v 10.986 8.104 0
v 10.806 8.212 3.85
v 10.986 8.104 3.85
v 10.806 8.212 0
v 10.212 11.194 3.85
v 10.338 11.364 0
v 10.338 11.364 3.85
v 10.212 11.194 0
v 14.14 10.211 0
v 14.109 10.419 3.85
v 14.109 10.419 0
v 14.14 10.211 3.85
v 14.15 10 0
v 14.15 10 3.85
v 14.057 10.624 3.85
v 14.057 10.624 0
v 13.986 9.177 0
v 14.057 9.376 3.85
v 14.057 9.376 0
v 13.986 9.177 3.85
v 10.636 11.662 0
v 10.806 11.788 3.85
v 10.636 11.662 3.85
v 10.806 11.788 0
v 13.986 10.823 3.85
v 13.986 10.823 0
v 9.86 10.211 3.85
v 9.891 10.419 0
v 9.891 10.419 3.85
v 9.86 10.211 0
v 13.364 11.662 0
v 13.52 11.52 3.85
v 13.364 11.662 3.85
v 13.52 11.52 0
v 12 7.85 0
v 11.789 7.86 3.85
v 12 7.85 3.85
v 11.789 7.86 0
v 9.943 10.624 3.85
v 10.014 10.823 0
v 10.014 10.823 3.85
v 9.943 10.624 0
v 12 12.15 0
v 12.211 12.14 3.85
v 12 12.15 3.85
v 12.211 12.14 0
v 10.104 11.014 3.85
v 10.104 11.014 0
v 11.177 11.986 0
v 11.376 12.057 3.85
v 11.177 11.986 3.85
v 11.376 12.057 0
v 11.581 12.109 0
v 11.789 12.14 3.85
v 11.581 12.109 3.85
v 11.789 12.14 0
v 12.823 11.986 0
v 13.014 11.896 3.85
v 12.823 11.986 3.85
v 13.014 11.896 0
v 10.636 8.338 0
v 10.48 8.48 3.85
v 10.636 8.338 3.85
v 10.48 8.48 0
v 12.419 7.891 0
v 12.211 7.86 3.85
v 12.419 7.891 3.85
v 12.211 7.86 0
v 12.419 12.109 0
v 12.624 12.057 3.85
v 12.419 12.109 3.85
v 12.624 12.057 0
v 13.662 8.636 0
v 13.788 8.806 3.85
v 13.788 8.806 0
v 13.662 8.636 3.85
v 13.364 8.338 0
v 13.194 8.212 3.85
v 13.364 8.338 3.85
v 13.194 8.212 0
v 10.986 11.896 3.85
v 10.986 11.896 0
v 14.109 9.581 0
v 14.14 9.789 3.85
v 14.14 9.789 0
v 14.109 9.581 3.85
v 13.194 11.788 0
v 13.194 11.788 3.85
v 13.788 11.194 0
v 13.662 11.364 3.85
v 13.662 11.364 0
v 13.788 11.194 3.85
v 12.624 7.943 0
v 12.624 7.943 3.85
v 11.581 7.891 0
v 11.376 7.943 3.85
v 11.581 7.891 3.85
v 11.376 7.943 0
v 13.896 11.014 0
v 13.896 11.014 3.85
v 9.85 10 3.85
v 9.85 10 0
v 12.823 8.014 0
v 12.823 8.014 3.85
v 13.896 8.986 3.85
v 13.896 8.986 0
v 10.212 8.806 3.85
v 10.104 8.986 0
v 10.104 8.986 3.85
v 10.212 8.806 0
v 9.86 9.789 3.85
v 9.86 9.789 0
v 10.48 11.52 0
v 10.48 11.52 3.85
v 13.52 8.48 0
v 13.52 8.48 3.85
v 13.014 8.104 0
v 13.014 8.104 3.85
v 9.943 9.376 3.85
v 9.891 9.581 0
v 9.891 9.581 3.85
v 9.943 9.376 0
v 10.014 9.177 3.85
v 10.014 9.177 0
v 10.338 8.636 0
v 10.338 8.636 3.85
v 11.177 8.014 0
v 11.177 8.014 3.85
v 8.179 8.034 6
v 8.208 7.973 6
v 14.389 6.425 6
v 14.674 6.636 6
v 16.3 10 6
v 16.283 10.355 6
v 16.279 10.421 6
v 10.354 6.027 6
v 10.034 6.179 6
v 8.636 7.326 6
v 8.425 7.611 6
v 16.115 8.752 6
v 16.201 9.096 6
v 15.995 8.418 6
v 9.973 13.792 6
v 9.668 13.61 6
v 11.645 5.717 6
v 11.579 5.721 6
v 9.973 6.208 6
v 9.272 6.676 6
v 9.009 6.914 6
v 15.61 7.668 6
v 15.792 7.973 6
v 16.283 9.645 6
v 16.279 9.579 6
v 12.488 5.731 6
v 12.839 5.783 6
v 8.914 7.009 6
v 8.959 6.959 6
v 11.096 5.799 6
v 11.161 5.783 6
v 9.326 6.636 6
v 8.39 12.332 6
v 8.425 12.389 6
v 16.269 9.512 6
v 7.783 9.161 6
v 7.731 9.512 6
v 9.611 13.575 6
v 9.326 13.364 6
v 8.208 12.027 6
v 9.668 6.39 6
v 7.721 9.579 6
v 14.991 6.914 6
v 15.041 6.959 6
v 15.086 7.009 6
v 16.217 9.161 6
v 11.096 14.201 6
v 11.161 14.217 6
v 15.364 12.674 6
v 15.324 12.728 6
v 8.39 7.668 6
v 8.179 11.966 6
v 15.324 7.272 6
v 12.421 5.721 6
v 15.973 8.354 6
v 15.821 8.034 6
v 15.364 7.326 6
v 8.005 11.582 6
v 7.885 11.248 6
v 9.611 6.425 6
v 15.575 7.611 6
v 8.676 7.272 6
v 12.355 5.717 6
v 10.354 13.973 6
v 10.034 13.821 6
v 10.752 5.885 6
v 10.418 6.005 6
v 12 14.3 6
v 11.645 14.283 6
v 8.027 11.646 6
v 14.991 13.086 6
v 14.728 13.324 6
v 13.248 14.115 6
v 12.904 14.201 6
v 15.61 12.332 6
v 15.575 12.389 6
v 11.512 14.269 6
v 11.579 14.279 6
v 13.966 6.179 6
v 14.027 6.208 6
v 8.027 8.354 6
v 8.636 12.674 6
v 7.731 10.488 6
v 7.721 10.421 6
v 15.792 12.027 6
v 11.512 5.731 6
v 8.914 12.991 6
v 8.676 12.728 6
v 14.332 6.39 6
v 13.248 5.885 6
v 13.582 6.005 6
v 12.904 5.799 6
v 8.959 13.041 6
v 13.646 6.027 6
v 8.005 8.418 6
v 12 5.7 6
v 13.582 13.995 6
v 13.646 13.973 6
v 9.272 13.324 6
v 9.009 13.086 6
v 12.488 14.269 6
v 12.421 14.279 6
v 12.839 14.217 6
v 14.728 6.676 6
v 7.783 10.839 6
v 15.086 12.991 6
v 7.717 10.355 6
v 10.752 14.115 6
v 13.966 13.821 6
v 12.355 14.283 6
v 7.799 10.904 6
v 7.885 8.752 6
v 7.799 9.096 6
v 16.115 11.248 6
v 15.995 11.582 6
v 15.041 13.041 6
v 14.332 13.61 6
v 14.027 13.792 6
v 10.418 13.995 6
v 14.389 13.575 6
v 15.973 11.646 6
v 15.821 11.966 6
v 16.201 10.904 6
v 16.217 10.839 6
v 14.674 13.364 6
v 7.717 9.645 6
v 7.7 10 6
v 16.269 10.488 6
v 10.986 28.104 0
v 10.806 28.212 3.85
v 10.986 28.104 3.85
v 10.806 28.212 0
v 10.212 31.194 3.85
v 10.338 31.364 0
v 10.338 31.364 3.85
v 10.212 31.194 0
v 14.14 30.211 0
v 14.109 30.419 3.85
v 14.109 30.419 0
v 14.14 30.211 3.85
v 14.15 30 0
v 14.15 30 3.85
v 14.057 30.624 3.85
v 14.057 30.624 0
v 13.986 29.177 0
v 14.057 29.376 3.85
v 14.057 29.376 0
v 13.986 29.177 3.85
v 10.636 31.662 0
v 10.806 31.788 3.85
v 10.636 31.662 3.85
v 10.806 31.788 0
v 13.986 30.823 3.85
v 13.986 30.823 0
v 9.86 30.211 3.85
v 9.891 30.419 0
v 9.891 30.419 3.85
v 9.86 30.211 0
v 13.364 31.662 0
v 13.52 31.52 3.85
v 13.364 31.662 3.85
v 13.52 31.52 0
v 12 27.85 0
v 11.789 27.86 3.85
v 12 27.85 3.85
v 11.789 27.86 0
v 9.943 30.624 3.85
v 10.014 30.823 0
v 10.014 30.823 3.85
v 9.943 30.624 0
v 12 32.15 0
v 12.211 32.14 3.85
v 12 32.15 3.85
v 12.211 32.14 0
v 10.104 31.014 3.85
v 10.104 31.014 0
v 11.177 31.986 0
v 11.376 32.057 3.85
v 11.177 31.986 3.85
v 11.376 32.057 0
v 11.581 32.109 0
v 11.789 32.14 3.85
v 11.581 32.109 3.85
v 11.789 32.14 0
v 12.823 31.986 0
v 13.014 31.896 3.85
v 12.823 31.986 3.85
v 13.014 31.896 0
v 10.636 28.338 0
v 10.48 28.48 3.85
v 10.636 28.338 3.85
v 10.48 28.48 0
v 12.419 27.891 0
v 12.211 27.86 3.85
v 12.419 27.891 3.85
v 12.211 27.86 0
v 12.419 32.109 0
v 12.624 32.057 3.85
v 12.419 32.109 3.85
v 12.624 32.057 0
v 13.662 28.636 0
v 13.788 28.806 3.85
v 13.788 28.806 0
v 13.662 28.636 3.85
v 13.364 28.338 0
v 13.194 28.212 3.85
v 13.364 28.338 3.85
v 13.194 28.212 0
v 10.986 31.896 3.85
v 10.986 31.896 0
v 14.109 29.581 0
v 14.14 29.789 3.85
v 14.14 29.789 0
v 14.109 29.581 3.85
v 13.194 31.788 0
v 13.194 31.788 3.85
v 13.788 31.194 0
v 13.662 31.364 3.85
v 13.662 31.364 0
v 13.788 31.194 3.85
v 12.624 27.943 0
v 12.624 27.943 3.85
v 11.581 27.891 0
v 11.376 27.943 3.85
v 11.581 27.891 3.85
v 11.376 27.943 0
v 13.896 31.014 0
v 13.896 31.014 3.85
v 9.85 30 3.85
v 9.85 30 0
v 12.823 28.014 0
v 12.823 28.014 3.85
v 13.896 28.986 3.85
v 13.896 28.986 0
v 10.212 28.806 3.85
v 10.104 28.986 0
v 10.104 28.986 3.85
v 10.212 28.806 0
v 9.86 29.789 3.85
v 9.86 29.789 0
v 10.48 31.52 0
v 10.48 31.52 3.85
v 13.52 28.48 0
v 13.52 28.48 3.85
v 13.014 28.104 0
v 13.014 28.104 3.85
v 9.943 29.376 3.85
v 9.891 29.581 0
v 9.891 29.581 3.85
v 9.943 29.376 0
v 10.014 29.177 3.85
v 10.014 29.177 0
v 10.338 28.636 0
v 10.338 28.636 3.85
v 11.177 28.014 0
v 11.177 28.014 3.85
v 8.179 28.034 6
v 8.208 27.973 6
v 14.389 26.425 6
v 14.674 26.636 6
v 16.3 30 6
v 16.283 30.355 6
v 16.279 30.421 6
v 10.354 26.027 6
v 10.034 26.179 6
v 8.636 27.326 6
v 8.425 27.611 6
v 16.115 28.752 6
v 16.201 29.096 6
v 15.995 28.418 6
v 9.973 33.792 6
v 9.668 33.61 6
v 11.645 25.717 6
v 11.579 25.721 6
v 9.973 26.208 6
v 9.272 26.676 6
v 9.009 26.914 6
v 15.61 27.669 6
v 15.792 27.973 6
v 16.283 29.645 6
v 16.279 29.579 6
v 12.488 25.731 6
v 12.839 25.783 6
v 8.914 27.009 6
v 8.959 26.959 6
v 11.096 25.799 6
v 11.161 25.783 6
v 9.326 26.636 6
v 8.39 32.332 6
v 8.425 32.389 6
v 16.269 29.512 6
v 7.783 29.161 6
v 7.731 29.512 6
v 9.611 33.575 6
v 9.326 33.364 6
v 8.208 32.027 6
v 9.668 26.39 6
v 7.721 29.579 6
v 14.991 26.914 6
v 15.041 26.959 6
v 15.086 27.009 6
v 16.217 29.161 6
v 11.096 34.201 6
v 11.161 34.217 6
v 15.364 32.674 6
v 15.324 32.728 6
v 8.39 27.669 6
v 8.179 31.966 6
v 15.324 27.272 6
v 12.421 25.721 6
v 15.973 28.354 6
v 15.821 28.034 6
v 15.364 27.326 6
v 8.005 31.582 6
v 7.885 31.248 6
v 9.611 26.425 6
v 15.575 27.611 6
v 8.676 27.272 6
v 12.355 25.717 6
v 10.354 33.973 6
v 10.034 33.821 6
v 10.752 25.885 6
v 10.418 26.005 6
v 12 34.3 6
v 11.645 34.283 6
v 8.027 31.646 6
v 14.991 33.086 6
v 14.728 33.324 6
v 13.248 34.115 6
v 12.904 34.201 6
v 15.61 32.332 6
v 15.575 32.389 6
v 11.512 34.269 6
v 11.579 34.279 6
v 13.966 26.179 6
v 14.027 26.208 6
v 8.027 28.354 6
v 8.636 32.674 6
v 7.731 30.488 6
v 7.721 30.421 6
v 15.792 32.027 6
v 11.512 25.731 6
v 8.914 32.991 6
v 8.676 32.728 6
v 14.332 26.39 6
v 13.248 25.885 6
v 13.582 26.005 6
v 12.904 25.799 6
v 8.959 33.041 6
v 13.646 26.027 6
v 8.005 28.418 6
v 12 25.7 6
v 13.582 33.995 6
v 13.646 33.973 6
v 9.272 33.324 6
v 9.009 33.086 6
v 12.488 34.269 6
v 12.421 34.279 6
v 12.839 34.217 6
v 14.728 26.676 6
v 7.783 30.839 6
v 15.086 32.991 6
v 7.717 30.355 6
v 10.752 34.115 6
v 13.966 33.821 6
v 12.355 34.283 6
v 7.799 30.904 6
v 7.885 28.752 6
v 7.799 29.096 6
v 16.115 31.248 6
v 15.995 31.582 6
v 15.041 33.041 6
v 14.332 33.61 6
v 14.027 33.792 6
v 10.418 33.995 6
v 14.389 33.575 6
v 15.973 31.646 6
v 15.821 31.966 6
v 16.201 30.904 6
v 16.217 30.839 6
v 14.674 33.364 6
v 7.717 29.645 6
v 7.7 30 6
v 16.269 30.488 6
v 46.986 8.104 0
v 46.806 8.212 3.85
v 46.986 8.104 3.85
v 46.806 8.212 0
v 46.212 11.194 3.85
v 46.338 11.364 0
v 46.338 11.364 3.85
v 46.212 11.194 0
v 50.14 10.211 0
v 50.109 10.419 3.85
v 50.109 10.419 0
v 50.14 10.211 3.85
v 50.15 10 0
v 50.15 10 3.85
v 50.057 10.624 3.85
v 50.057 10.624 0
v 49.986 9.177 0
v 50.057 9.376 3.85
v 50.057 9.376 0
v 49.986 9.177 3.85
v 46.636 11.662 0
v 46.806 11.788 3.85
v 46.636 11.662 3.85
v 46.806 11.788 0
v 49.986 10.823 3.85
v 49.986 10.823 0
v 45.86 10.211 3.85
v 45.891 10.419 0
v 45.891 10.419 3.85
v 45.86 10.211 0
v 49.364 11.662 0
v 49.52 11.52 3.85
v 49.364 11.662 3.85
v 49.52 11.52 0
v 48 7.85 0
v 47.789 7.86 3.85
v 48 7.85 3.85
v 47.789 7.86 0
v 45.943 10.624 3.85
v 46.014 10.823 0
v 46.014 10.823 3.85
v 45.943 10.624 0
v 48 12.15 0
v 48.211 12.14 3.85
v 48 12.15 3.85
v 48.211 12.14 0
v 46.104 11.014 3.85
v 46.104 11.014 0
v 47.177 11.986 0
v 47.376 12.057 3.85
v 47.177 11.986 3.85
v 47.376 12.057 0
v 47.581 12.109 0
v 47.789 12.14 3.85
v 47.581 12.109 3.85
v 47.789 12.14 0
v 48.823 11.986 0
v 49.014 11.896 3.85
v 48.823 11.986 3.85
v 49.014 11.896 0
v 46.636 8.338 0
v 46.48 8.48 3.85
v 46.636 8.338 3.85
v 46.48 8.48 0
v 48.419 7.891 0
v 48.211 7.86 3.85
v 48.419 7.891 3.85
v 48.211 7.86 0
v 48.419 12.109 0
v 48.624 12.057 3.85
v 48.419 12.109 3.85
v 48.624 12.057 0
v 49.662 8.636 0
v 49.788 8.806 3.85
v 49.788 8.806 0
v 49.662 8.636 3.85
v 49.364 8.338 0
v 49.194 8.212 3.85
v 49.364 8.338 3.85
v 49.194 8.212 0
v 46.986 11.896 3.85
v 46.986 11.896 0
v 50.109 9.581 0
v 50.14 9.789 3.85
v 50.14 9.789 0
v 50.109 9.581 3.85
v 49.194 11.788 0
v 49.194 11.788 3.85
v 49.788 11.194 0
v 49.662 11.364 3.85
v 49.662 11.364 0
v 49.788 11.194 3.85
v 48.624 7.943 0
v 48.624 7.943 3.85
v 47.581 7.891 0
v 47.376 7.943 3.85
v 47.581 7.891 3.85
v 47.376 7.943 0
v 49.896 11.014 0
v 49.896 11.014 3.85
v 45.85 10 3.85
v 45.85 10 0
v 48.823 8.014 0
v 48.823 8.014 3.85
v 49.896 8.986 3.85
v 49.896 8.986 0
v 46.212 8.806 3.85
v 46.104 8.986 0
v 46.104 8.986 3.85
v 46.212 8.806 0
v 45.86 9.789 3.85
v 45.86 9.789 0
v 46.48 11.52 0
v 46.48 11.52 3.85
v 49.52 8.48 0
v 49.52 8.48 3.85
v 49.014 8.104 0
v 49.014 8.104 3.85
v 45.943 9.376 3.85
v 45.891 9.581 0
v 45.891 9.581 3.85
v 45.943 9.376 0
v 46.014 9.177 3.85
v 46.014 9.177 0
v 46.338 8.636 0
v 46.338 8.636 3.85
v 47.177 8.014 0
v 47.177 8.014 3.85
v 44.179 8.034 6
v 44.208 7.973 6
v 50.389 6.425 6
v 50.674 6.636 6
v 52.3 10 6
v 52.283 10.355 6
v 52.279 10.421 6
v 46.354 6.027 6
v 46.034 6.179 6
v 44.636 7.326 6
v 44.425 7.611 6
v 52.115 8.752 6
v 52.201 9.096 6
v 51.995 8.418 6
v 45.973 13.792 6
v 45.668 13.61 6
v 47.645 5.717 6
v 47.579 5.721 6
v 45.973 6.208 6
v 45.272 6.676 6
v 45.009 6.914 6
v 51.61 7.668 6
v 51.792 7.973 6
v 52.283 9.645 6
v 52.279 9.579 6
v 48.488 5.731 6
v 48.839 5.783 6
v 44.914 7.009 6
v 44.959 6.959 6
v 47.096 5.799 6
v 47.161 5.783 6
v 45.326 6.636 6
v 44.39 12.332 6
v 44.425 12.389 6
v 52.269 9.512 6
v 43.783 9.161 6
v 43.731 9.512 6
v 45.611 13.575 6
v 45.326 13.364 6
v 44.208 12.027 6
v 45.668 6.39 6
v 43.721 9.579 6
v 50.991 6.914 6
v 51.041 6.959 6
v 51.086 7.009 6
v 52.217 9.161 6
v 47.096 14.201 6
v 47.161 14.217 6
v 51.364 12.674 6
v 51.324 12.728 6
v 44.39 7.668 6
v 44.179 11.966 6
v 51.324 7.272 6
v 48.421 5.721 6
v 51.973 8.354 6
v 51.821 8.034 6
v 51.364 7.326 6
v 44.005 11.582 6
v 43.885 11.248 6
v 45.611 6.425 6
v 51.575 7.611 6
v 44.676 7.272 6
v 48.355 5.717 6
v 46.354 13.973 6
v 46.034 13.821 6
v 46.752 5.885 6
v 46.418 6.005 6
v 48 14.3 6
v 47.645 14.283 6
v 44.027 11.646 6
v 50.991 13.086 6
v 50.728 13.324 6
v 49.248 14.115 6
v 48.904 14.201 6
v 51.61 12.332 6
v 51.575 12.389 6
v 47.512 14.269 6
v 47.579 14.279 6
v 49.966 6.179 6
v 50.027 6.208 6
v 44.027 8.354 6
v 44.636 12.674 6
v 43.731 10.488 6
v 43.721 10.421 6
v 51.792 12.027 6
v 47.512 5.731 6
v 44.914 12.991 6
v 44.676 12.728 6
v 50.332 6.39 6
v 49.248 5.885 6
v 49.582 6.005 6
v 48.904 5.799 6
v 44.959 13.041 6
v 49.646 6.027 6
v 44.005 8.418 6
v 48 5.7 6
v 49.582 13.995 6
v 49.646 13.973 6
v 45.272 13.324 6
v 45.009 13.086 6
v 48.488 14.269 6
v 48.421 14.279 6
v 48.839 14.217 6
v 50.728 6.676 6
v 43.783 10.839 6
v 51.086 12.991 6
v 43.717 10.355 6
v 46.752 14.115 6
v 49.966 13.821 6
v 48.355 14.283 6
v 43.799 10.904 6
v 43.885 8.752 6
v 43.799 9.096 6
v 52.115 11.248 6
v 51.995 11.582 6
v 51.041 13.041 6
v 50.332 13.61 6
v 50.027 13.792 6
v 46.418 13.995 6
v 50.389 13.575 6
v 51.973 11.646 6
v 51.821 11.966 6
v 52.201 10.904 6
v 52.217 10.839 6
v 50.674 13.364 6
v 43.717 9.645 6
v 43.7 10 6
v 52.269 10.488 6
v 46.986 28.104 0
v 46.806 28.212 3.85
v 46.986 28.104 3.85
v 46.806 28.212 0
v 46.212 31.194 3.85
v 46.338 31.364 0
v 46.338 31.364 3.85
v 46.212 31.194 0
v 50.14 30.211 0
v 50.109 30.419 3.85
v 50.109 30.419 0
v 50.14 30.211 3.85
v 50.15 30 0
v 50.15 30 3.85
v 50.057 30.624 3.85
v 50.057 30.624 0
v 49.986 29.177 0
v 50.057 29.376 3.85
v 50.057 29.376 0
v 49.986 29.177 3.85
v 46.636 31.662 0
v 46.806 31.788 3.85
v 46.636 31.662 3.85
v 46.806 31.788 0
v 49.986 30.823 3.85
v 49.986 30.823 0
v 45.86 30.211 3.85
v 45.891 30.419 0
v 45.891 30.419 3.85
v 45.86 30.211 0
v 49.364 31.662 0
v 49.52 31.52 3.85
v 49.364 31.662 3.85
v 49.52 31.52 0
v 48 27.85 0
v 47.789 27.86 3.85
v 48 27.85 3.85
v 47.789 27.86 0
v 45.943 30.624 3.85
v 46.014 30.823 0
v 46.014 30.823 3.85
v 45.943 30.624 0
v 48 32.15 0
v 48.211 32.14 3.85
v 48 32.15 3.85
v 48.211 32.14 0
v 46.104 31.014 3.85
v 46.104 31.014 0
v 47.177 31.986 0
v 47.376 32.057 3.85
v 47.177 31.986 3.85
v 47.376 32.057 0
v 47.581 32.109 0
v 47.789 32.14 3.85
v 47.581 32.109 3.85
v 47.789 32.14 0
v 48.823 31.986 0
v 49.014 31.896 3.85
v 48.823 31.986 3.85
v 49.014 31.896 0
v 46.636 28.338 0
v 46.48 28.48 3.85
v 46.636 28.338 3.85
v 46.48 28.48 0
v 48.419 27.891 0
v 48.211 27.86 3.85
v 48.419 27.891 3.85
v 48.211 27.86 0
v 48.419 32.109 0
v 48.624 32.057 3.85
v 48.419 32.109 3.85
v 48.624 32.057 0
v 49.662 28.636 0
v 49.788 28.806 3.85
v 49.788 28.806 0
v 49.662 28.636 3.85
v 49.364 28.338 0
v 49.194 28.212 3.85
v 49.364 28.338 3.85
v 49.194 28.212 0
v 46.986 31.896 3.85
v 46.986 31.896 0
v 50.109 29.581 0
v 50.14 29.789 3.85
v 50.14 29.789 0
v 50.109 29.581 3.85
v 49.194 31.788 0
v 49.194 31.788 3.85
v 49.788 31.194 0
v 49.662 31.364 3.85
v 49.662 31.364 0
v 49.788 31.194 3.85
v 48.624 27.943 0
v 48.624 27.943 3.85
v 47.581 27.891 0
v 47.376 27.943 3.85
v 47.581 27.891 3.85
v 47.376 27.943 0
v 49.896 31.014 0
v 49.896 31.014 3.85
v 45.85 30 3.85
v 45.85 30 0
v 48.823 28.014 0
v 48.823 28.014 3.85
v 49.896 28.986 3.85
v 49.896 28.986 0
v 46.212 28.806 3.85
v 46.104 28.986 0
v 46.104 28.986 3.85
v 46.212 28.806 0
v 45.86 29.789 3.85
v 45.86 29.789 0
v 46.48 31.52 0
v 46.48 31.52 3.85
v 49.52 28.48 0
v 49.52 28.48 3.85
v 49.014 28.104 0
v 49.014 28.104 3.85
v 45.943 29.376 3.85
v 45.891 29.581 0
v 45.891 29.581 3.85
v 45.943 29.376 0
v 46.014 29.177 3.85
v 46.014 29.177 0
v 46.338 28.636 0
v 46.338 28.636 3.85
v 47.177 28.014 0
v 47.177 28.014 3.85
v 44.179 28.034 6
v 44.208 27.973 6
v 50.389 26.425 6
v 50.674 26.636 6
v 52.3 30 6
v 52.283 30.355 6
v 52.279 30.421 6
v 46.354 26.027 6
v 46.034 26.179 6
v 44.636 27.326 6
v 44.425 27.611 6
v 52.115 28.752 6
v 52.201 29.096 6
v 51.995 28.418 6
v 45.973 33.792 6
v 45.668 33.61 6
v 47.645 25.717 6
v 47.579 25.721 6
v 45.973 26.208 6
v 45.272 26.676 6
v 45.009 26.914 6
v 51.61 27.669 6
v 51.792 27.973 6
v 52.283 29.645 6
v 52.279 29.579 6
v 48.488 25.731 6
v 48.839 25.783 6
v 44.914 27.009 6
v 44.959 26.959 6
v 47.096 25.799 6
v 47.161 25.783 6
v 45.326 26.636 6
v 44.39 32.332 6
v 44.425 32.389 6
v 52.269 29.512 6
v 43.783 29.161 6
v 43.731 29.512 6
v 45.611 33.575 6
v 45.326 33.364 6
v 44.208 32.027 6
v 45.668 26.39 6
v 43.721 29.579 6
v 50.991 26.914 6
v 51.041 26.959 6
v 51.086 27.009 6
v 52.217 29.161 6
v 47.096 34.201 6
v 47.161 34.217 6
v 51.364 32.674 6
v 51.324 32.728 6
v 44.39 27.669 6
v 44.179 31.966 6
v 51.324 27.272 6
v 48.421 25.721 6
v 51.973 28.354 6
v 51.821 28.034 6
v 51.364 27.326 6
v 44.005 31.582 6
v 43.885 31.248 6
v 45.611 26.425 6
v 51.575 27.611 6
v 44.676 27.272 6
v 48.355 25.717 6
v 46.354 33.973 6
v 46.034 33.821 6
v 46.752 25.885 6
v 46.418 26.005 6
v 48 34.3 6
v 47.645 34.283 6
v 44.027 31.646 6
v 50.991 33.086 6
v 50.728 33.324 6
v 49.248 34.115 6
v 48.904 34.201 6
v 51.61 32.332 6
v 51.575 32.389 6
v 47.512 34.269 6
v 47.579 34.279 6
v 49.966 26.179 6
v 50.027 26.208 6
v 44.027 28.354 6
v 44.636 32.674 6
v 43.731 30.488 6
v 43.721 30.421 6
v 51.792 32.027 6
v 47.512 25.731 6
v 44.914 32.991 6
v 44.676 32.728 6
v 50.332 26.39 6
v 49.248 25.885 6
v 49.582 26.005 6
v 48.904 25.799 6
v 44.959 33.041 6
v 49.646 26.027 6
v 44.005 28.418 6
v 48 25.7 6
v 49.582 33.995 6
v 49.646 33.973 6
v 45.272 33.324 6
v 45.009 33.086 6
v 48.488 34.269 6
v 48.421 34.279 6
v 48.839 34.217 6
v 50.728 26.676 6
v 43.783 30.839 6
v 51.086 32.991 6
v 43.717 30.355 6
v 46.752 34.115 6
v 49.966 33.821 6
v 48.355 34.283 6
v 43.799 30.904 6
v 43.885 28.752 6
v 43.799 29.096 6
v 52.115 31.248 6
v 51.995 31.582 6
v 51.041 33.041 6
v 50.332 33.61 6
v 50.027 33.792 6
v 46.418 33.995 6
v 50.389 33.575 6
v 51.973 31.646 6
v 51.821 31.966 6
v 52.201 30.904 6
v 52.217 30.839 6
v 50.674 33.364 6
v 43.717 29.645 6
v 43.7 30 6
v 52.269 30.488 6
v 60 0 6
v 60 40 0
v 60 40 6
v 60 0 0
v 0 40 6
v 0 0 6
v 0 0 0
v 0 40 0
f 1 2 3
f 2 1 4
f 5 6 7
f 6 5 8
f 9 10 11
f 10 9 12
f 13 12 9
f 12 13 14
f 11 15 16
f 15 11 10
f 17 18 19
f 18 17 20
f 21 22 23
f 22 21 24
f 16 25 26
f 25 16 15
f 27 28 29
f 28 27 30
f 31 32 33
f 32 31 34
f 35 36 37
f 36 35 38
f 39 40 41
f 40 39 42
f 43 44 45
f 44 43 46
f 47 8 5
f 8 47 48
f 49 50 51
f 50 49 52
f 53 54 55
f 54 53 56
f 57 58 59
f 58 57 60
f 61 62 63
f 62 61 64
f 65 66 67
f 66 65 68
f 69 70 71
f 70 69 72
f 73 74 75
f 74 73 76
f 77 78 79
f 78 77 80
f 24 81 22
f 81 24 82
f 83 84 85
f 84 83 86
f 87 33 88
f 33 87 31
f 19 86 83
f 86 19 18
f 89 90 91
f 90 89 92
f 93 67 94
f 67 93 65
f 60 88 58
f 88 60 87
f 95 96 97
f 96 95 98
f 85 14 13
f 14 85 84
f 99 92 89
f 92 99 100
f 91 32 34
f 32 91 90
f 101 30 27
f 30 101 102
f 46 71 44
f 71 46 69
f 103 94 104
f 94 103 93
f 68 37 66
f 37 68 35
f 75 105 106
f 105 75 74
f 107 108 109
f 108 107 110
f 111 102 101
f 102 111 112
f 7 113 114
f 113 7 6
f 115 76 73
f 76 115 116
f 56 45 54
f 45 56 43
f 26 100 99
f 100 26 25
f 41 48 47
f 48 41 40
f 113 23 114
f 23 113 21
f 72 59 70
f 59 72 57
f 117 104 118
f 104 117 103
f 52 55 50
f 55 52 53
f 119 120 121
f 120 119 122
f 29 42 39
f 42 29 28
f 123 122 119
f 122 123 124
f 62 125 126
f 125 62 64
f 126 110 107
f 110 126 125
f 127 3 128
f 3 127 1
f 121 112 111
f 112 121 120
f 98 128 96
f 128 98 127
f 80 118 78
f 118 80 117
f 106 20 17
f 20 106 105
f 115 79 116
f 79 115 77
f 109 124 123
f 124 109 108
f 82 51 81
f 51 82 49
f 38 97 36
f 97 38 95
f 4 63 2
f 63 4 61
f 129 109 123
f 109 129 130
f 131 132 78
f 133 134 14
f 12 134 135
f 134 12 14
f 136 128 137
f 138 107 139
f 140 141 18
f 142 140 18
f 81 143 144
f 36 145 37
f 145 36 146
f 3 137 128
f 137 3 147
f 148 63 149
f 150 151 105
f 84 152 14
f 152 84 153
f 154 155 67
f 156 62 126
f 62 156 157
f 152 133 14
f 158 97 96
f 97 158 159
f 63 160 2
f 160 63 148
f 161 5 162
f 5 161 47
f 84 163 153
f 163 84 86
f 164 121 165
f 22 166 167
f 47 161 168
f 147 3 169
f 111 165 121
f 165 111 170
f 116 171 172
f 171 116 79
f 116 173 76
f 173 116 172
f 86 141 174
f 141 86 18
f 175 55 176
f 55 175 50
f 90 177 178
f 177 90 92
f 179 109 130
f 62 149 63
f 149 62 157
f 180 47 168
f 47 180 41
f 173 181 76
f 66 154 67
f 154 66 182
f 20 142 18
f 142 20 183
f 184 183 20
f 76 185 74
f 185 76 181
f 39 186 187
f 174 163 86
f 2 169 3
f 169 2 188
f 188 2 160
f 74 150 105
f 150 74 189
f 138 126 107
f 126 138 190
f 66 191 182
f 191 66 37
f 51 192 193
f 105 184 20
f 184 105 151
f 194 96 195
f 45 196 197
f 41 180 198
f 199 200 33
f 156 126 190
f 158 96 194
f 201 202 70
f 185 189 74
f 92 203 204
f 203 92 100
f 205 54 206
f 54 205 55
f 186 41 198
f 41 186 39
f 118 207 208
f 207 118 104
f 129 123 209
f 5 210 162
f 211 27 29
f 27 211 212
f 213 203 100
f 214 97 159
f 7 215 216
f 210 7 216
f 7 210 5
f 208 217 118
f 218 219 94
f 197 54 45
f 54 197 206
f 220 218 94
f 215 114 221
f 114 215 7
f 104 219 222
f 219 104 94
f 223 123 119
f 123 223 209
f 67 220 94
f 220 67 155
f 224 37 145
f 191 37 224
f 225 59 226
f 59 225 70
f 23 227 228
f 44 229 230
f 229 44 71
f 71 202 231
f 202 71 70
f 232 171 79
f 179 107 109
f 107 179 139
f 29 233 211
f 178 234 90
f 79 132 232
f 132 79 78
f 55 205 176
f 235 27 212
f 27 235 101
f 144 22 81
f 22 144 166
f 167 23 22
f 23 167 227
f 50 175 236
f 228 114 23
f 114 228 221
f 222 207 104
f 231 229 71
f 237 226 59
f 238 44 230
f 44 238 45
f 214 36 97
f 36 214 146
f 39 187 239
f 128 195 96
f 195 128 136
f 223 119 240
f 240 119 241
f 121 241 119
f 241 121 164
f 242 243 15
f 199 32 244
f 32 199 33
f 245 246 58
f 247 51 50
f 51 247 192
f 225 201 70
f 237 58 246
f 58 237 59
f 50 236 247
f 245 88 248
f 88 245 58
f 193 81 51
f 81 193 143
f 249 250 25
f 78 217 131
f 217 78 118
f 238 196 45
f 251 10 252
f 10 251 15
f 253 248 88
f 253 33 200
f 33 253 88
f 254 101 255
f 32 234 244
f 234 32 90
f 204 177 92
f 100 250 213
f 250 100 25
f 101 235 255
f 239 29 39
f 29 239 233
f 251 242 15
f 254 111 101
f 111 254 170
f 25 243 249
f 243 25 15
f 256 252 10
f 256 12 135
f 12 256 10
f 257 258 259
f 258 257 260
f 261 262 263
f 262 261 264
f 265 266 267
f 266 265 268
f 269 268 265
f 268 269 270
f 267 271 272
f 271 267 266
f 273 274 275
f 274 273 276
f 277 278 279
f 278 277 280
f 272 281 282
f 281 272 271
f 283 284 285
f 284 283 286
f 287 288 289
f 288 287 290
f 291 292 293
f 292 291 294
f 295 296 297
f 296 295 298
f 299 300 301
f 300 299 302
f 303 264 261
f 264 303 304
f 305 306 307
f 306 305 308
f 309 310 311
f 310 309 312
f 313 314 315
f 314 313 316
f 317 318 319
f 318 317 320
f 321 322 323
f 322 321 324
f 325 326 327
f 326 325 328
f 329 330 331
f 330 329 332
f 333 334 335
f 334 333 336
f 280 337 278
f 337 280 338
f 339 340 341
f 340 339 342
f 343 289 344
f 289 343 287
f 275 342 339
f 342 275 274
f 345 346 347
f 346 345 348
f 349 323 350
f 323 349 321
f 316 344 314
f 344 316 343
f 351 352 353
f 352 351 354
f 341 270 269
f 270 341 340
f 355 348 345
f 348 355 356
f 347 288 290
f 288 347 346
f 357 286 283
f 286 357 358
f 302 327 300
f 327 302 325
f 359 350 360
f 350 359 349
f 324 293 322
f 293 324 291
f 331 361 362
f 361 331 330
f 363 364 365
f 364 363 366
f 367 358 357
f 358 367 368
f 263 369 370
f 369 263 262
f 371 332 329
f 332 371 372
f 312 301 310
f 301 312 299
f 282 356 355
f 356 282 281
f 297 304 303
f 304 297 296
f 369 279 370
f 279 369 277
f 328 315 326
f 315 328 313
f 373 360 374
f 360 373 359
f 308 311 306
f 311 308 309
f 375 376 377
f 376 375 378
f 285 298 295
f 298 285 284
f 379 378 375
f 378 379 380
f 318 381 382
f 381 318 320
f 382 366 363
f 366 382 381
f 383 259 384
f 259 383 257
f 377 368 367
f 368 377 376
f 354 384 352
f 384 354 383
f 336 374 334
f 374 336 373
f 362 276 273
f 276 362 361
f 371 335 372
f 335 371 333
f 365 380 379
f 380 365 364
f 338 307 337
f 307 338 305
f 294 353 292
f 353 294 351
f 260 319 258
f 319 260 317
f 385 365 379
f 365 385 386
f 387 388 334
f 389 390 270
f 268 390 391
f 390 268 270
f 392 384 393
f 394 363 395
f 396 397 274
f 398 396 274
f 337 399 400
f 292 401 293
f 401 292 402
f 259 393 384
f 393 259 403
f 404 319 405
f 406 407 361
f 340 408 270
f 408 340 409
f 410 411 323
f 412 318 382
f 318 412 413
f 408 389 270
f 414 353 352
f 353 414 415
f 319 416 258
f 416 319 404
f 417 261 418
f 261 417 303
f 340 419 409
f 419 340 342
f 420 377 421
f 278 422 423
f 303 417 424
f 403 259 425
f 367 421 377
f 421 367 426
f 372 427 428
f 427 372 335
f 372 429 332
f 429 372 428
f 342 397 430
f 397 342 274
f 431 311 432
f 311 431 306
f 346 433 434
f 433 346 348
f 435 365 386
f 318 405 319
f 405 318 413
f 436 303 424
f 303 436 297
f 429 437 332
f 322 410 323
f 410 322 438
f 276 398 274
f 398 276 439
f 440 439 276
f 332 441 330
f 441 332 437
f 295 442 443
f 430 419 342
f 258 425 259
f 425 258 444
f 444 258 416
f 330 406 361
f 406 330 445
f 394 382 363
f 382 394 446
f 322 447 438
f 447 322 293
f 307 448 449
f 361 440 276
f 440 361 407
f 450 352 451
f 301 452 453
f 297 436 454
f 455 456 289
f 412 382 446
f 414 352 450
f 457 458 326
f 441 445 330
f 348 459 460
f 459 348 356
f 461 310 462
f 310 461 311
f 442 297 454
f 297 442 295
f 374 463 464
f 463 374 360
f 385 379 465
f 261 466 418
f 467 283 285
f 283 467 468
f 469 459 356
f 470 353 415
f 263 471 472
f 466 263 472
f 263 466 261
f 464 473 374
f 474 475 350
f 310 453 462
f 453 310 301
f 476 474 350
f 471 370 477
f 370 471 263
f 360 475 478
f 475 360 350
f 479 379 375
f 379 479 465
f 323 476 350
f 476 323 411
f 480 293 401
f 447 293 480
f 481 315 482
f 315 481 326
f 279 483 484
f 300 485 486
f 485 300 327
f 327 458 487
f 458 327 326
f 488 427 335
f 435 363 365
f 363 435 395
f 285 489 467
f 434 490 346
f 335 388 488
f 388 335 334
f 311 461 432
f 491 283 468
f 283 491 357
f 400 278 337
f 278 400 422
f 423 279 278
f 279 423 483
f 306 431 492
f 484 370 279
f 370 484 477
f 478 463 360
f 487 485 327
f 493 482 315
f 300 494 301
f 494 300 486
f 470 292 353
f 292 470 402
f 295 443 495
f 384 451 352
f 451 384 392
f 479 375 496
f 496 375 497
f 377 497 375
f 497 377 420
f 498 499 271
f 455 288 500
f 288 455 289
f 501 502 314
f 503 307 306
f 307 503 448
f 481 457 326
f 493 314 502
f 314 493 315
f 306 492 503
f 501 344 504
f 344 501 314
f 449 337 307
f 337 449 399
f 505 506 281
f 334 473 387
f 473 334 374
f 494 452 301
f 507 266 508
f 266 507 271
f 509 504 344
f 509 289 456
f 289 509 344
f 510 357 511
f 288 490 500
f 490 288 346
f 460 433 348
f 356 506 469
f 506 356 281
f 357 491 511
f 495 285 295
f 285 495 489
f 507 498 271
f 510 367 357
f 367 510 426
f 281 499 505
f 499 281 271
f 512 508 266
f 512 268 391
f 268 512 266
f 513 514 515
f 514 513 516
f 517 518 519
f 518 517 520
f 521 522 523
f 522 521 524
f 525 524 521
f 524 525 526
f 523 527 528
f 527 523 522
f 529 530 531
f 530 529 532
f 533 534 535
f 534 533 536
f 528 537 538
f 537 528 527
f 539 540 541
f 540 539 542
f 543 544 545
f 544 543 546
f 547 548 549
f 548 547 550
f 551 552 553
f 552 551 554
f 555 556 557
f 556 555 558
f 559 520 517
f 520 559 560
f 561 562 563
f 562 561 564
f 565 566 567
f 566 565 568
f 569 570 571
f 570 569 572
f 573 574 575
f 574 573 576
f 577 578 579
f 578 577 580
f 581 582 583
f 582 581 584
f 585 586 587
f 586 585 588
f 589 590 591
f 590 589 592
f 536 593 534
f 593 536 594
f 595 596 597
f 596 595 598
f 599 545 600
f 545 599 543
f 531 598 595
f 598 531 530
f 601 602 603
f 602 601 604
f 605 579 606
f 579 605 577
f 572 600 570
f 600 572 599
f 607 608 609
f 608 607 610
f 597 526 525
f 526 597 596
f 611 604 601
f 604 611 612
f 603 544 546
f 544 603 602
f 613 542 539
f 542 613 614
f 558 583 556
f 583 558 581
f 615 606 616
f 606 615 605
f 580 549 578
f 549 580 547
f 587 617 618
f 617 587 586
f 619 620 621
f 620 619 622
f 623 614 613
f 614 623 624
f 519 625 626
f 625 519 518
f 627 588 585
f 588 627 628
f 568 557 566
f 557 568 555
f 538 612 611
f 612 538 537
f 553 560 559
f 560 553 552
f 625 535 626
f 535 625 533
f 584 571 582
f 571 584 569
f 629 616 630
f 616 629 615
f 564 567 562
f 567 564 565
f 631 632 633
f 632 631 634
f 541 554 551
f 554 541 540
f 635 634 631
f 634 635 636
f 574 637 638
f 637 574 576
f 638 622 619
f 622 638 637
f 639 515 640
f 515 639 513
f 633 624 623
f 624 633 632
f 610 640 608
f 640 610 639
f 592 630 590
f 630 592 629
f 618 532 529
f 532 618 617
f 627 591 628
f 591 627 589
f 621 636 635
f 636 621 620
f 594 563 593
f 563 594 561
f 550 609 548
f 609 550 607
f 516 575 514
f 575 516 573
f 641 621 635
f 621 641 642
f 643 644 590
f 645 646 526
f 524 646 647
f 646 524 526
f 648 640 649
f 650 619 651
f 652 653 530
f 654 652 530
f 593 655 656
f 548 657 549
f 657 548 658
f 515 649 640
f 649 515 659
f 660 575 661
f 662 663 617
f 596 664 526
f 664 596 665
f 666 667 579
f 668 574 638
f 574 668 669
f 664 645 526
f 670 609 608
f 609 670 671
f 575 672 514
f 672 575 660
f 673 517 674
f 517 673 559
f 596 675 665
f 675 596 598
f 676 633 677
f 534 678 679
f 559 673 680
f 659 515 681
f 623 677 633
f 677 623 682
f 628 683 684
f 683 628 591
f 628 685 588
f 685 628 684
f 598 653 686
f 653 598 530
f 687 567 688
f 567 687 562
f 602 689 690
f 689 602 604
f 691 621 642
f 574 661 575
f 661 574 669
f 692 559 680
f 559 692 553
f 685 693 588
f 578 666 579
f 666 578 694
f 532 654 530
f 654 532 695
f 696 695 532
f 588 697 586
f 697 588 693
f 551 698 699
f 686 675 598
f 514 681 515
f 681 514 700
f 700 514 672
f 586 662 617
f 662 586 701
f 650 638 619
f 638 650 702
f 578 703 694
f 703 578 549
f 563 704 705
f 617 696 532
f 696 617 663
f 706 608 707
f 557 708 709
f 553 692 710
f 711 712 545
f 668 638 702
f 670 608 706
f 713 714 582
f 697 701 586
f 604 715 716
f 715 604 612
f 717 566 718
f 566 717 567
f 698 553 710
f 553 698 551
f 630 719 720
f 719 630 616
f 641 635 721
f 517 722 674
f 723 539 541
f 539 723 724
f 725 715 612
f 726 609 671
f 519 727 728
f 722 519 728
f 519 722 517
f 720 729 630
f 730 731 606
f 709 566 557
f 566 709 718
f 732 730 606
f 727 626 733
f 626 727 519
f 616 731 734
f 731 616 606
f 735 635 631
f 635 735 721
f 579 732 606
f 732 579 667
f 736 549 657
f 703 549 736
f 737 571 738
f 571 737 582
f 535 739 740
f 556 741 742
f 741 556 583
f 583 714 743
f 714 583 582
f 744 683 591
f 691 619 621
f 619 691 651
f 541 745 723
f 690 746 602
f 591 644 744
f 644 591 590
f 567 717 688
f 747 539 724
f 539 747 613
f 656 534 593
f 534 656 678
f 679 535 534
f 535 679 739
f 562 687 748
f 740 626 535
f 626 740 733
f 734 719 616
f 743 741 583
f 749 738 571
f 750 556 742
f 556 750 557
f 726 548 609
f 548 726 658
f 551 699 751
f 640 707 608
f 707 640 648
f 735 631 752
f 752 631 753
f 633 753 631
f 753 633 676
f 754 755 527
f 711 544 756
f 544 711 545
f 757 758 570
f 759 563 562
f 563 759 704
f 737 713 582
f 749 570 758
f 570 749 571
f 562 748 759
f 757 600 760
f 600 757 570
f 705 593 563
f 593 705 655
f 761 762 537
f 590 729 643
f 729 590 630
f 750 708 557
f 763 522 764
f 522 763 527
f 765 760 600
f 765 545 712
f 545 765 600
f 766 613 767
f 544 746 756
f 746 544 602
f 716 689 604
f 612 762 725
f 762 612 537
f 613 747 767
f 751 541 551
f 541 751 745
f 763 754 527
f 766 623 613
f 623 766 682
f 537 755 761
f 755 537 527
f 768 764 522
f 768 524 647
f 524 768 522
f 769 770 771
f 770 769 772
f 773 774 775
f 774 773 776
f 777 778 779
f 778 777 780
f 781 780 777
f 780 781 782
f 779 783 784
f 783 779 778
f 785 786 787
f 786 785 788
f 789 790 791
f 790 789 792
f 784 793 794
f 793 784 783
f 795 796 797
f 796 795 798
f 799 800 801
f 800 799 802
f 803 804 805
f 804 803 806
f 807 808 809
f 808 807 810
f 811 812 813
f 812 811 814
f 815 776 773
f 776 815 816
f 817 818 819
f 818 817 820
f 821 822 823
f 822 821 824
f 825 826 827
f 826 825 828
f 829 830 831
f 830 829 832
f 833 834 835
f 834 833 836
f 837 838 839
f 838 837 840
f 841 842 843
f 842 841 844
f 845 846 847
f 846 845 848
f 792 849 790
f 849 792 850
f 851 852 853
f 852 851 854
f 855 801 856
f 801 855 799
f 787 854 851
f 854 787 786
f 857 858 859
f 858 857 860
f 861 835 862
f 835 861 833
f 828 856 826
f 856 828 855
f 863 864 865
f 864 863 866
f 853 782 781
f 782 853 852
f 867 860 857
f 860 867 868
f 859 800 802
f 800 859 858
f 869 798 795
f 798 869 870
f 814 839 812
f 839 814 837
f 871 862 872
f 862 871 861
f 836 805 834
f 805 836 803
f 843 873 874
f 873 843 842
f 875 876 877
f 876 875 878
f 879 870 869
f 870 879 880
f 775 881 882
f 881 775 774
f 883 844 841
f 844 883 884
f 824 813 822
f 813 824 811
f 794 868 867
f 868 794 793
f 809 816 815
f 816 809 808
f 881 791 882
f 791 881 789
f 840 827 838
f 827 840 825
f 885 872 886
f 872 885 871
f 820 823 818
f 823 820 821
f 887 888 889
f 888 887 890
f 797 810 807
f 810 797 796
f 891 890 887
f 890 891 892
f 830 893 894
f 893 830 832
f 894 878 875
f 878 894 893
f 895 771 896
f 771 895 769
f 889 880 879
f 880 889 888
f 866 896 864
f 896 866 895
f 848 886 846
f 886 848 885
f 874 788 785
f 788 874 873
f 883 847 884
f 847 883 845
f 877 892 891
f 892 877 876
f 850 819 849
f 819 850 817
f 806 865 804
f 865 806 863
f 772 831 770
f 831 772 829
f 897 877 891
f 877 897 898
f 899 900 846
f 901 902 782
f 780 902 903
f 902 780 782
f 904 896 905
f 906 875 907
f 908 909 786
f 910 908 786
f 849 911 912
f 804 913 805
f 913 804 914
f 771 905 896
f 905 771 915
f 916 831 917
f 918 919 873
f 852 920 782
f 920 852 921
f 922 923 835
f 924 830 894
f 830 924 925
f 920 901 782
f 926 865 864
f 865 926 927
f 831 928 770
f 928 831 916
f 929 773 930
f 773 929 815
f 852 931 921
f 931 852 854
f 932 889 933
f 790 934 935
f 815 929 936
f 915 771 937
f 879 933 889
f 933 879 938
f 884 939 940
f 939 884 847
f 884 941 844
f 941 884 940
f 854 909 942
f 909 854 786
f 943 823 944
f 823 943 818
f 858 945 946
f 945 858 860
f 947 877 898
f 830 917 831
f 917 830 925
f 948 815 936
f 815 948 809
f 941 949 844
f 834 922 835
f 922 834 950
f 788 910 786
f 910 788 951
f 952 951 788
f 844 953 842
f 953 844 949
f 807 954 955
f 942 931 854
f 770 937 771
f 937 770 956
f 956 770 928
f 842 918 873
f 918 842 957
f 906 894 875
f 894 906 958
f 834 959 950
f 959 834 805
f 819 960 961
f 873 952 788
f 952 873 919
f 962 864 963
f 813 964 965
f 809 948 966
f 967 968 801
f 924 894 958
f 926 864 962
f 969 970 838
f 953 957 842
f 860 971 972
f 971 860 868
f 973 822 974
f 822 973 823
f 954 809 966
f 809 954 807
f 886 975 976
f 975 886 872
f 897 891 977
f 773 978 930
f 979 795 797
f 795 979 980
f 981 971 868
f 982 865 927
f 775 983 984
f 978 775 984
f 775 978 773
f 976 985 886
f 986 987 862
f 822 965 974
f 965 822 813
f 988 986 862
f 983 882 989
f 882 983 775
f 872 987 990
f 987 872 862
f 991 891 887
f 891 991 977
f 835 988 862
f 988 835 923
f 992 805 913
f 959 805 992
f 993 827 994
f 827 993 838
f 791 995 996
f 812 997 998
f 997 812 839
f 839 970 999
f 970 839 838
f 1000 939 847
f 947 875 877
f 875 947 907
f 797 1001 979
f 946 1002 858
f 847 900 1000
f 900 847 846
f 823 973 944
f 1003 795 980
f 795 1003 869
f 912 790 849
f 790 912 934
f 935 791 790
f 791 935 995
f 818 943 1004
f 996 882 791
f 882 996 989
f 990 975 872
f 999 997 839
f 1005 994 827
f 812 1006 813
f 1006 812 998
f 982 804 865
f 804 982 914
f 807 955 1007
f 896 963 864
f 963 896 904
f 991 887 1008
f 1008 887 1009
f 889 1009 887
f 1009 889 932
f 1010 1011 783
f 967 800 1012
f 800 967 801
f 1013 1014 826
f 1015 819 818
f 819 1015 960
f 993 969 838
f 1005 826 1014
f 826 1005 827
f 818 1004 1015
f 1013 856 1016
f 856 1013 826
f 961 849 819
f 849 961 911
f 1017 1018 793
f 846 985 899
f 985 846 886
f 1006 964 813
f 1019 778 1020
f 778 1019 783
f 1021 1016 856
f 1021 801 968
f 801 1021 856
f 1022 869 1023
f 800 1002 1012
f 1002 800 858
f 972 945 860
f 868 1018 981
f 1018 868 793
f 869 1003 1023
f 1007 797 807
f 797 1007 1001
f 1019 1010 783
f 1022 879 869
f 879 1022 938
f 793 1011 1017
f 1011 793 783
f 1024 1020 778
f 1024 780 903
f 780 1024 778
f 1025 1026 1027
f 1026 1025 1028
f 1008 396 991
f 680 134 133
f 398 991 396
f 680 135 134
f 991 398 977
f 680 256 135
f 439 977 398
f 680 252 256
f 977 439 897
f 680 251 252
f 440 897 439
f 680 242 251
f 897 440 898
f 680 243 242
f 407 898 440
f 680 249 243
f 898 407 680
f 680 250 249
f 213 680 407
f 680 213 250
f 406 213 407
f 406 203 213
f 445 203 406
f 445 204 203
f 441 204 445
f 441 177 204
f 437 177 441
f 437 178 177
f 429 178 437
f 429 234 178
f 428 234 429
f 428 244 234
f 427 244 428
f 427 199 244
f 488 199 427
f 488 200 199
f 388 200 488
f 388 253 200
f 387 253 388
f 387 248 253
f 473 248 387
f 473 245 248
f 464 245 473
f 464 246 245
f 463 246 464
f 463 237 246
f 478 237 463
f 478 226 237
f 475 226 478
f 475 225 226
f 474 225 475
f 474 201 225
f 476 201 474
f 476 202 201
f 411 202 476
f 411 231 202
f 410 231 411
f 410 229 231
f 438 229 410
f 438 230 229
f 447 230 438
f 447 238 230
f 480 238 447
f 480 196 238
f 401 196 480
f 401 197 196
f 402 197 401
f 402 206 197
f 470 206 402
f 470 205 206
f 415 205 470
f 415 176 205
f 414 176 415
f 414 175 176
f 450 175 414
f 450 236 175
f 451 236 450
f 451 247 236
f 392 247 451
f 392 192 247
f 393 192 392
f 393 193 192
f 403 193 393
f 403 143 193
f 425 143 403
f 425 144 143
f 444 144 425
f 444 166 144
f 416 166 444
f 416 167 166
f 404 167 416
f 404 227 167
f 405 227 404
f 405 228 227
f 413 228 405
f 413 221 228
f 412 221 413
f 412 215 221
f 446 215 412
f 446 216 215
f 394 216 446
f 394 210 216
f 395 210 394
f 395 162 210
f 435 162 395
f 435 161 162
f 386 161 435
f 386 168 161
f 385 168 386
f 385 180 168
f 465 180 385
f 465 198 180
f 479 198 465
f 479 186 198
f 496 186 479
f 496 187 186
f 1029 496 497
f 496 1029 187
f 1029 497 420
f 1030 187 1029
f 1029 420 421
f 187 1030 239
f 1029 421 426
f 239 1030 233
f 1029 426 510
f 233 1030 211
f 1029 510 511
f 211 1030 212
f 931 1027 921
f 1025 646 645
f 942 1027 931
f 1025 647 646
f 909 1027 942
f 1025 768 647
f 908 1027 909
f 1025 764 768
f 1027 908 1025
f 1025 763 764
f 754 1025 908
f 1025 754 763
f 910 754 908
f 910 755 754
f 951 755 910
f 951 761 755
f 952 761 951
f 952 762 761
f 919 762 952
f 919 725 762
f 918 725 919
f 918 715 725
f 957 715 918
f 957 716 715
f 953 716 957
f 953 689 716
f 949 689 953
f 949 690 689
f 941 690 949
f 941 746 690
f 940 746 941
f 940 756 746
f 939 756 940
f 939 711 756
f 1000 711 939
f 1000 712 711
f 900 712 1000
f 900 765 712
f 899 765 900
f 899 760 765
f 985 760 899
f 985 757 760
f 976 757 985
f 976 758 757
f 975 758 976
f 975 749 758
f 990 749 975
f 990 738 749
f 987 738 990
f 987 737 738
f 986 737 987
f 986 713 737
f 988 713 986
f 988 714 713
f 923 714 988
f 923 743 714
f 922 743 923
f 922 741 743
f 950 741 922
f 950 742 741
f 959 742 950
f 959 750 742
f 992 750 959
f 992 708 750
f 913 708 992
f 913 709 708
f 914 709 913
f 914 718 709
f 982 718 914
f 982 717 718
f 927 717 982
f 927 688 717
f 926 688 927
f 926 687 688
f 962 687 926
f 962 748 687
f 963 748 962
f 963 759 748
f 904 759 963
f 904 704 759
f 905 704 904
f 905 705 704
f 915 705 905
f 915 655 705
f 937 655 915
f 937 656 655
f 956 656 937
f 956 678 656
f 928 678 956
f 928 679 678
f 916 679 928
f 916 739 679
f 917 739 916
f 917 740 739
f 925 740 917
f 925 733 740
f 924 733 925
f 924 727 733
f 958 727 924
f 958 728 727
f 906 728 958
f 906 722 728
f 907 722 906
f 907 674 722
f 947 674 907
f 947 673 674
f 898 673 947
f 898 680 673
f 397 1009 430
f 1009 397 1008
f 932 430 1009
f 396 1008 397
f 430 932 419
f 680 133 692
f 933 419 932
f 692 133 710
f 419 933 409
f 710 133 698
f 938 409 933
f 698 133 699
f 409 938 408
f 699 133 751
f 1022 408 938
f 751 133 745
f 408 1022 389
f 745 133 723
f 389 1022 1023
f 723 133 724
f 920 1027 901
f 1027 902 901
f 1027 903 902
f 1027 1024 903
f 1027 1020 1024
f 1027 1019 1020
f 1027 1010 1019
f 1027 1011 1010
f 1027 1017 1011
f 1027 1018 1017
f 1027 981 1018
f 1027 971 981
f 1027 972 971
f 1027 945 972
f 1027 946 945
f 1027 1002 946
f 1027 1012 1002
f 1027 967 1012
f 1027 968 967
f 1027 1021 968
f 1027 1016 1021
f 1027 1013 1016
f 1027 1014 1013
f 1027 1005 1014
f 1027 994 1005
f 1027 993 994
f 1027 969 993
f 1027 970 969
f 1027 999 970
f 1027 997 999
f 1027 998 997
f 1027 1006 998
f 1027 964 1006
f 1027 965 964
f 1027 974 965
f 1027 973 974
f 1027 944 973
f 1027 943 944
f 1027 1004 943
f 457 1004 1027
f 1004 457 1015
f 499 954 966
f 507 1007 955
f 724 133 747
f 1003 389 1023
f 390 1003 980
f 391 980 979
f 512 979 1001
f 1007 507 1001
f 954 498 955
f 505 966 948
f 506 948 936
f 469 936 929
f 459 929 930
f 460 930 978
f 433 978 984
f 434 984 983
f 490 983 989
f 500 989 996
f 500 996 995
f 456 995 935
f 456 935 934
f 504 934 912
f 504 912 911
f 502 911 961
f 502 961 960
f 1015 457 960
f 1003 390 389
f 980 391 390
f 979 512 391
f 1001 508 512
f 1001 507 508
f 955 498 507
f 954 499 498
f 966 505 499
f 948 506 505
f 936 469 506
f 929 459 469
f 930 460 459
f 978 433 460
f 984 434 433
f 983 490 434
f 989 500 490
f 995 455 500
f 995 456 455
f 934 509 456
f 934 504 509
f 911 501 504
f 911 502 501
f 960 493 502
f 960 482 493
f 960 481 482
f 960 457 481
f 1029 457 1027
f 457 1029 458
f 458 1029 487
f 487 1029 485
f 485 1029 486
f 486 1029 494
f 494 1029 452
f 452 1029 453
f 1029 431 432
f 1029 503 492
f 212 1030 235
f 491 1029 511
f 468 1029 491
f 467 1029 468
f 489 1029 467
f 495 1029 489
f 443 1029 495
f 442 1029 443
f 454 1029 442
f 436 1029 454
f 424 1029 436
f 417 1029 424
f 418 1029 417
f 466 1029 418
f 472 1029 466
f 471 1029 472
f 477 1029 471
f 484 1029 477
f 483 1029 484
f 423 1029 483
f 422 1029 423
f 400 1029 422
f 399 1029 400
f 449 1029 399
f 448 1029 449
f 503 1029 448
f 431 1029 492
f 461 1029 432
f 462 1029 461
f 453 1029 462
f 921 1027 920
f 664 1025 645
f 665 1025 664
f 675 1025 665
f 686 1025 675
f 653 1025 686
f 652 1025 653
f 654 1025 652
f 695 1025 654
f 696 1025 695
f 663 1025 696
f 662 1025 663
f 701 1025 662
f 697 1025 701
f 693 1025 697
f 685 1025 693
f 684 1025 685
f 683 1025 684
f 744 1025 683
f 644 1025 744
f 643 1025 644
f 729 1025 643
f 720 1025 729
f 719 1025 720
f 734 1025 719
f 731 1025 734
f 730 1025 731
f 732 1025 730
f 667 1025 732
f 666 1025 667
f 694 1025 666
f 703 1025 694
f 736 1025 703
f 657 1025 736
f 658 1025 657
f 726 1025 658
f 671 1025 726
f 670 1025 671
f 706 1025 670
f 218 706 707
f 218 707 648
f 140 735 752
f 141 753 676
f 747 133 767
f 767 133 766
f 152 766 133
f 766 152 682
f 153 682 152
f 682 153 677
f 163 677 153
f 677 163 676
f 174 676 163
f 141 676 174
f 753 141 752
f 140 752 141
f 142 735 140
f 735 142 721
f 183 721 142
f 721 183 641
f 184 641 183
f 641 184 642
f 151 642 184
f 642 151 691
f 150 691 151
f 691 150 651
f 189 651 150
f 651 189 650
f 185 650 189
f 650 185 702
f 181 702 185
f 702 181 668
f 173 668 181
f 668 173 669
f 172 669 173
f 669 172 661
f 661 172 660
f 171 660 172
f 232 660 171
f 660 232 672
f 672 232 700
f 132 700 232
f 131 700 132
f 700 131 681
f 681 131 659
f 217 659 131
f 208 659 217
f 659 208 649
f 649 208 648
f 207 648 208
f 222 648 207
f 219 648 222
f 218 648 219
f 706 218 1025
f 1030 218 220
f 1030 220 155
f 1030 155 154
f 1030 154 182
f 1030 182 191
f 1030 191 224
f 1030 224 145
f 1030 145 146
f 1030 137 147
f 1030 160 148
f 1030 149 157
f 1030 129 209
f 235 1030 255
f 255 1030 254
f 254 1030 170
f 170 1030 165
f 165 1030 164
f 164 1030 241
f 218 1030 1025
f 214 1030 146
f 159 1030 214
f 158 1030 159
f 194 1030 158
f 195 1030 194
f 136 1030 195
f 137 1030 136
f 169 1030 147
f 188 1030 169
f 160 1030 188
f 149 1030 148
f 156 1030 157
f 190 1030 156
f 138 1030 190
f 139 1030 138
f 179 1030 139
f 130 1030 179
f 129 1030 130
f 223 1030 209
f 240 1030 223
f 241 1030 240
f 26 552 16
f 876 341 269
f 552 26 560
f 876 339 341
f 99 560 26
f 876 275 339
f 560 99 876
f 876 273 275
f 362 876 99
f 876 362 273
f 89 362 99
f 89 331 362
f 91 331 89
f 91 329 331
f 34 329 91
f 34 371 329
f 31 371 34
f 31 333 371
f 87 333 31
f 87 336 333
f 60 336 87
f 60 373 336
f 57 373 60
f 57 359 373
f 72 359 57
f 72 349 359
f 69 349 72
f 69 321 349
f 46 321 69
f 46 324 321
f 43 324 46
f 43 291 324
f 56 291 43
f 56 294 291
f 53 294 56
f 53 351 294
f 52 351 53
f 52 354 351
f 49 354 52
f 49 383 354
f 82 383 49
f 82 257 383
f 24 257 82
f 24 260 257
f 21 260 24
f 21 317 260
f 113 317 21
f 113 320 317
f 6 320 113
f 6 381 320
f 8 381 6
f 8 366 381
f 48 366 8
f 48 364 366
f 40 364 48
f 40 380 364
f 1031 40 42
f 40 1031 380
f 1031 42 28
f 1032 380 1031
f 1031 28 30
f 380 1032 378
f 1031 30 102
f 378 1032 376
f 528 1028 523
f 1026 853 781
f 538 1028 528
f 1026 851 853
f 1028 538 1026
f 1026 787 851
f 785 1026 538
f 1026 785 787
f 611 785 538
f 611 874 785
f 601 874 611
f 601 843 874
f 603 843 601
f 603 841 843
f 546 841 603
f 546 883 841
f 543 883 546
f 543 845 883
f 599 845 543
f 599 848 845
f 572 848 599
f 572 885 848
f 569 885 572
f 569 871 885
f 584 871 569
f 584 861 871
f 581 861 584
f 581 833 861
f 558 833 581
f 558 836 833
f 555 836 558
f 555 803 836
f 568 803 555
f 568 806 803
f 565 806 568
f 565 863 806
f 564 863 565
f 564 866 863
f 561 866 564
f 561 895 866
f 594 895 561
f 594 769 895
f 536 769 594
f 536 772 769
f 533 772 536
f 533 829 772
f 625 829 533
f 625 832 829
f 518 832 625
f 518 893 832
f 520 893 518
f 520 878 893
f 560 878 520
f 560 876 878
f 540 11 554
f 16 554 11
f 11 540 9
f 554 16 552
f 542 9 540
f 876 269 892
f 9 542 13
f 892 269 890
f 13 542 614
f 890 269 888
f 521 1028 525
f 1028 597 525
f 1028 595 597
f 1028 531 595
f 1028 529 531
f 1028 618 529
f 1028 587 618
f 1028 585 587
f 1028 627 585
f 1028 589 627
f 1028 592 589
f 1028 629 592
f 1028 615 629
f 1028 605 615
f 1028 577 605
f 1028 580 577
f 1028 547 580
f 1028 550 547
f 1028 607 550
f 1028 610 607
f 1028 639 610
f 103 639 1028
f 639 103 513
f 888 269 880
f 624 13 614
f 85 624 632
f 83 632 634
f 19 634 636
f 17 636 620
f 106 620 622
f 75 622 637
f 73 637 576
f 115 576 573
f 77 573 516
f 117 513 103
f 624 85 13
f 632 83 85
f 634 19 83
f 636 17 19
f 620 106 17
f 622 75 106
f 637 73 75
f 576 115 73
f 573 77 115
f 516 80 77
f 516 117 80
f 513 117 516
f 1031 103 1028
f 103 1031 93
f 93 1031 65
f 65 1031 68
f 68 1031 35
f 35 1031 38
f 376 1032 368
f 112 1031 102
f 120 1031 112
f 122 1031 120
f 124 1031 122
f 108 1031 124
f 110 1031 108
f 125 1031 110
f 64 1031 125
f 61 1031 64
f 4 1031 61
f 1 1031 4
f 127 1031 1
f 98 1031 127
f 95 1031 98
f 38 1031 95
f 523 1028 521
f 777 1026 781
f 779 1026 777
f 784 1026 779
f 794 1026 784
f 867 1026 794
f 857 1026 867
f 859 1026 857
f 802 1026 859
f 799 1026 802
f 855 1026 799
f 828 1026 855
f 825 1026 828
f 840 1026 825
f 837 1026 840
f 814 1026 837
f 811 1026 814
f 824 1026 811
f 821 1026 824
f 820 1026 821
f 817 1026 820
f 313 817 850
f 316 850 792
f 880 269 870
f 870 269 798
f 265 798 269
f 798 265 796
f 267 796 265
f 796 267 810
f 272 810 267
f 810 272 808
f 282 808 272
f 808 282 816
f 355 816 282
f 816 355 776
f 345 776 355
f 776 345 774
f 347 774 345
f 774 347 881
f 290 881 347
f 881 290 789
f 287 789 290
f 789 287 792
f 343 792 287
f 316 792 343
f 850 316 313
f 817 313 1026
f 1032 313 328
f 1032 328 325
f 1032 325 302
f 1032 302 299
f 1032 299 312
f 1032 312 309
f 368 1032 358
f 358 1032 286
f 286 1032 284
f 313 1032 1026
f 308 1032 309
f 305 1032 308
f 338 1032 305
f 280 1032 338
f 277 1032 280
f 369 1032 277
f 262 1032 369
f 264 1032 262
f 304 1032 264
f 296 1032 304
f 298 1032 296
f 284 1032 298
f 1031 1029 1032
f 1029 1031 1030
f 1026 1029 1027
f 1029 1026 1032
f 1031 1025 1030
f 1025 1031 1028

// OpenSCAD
// Plate with four 90-degree countersunk holes for M4 flat head screws.
plate_x = 60;
plate_y = 40;
plate_z = 6;
hole_d = 4.3;
head_d = 8.6;
cs_depth = (head_d - hole_d) / 2;   // 90 degree included angle

module countersunk_hole() {
    translate([0, 0, -1])
        cylinder(h = plate_z + 2, d = hole_d, $fn = 64);
    translate([0, 0, plate_z - cs_depth])
        cylinder(h = cs_depth + 1, d1 = hole_d, d2 = head_d + 2, $fn = 64);
}

module plate() {
    difference() {
        cube([plate_x, plate_y, plate_z]);
        for (x = [12, plate_x - 12])
            for (y = [10, plate_y - 10])
                translate([x, y, 0]) countersunk_hole();
    }
}

plate();
